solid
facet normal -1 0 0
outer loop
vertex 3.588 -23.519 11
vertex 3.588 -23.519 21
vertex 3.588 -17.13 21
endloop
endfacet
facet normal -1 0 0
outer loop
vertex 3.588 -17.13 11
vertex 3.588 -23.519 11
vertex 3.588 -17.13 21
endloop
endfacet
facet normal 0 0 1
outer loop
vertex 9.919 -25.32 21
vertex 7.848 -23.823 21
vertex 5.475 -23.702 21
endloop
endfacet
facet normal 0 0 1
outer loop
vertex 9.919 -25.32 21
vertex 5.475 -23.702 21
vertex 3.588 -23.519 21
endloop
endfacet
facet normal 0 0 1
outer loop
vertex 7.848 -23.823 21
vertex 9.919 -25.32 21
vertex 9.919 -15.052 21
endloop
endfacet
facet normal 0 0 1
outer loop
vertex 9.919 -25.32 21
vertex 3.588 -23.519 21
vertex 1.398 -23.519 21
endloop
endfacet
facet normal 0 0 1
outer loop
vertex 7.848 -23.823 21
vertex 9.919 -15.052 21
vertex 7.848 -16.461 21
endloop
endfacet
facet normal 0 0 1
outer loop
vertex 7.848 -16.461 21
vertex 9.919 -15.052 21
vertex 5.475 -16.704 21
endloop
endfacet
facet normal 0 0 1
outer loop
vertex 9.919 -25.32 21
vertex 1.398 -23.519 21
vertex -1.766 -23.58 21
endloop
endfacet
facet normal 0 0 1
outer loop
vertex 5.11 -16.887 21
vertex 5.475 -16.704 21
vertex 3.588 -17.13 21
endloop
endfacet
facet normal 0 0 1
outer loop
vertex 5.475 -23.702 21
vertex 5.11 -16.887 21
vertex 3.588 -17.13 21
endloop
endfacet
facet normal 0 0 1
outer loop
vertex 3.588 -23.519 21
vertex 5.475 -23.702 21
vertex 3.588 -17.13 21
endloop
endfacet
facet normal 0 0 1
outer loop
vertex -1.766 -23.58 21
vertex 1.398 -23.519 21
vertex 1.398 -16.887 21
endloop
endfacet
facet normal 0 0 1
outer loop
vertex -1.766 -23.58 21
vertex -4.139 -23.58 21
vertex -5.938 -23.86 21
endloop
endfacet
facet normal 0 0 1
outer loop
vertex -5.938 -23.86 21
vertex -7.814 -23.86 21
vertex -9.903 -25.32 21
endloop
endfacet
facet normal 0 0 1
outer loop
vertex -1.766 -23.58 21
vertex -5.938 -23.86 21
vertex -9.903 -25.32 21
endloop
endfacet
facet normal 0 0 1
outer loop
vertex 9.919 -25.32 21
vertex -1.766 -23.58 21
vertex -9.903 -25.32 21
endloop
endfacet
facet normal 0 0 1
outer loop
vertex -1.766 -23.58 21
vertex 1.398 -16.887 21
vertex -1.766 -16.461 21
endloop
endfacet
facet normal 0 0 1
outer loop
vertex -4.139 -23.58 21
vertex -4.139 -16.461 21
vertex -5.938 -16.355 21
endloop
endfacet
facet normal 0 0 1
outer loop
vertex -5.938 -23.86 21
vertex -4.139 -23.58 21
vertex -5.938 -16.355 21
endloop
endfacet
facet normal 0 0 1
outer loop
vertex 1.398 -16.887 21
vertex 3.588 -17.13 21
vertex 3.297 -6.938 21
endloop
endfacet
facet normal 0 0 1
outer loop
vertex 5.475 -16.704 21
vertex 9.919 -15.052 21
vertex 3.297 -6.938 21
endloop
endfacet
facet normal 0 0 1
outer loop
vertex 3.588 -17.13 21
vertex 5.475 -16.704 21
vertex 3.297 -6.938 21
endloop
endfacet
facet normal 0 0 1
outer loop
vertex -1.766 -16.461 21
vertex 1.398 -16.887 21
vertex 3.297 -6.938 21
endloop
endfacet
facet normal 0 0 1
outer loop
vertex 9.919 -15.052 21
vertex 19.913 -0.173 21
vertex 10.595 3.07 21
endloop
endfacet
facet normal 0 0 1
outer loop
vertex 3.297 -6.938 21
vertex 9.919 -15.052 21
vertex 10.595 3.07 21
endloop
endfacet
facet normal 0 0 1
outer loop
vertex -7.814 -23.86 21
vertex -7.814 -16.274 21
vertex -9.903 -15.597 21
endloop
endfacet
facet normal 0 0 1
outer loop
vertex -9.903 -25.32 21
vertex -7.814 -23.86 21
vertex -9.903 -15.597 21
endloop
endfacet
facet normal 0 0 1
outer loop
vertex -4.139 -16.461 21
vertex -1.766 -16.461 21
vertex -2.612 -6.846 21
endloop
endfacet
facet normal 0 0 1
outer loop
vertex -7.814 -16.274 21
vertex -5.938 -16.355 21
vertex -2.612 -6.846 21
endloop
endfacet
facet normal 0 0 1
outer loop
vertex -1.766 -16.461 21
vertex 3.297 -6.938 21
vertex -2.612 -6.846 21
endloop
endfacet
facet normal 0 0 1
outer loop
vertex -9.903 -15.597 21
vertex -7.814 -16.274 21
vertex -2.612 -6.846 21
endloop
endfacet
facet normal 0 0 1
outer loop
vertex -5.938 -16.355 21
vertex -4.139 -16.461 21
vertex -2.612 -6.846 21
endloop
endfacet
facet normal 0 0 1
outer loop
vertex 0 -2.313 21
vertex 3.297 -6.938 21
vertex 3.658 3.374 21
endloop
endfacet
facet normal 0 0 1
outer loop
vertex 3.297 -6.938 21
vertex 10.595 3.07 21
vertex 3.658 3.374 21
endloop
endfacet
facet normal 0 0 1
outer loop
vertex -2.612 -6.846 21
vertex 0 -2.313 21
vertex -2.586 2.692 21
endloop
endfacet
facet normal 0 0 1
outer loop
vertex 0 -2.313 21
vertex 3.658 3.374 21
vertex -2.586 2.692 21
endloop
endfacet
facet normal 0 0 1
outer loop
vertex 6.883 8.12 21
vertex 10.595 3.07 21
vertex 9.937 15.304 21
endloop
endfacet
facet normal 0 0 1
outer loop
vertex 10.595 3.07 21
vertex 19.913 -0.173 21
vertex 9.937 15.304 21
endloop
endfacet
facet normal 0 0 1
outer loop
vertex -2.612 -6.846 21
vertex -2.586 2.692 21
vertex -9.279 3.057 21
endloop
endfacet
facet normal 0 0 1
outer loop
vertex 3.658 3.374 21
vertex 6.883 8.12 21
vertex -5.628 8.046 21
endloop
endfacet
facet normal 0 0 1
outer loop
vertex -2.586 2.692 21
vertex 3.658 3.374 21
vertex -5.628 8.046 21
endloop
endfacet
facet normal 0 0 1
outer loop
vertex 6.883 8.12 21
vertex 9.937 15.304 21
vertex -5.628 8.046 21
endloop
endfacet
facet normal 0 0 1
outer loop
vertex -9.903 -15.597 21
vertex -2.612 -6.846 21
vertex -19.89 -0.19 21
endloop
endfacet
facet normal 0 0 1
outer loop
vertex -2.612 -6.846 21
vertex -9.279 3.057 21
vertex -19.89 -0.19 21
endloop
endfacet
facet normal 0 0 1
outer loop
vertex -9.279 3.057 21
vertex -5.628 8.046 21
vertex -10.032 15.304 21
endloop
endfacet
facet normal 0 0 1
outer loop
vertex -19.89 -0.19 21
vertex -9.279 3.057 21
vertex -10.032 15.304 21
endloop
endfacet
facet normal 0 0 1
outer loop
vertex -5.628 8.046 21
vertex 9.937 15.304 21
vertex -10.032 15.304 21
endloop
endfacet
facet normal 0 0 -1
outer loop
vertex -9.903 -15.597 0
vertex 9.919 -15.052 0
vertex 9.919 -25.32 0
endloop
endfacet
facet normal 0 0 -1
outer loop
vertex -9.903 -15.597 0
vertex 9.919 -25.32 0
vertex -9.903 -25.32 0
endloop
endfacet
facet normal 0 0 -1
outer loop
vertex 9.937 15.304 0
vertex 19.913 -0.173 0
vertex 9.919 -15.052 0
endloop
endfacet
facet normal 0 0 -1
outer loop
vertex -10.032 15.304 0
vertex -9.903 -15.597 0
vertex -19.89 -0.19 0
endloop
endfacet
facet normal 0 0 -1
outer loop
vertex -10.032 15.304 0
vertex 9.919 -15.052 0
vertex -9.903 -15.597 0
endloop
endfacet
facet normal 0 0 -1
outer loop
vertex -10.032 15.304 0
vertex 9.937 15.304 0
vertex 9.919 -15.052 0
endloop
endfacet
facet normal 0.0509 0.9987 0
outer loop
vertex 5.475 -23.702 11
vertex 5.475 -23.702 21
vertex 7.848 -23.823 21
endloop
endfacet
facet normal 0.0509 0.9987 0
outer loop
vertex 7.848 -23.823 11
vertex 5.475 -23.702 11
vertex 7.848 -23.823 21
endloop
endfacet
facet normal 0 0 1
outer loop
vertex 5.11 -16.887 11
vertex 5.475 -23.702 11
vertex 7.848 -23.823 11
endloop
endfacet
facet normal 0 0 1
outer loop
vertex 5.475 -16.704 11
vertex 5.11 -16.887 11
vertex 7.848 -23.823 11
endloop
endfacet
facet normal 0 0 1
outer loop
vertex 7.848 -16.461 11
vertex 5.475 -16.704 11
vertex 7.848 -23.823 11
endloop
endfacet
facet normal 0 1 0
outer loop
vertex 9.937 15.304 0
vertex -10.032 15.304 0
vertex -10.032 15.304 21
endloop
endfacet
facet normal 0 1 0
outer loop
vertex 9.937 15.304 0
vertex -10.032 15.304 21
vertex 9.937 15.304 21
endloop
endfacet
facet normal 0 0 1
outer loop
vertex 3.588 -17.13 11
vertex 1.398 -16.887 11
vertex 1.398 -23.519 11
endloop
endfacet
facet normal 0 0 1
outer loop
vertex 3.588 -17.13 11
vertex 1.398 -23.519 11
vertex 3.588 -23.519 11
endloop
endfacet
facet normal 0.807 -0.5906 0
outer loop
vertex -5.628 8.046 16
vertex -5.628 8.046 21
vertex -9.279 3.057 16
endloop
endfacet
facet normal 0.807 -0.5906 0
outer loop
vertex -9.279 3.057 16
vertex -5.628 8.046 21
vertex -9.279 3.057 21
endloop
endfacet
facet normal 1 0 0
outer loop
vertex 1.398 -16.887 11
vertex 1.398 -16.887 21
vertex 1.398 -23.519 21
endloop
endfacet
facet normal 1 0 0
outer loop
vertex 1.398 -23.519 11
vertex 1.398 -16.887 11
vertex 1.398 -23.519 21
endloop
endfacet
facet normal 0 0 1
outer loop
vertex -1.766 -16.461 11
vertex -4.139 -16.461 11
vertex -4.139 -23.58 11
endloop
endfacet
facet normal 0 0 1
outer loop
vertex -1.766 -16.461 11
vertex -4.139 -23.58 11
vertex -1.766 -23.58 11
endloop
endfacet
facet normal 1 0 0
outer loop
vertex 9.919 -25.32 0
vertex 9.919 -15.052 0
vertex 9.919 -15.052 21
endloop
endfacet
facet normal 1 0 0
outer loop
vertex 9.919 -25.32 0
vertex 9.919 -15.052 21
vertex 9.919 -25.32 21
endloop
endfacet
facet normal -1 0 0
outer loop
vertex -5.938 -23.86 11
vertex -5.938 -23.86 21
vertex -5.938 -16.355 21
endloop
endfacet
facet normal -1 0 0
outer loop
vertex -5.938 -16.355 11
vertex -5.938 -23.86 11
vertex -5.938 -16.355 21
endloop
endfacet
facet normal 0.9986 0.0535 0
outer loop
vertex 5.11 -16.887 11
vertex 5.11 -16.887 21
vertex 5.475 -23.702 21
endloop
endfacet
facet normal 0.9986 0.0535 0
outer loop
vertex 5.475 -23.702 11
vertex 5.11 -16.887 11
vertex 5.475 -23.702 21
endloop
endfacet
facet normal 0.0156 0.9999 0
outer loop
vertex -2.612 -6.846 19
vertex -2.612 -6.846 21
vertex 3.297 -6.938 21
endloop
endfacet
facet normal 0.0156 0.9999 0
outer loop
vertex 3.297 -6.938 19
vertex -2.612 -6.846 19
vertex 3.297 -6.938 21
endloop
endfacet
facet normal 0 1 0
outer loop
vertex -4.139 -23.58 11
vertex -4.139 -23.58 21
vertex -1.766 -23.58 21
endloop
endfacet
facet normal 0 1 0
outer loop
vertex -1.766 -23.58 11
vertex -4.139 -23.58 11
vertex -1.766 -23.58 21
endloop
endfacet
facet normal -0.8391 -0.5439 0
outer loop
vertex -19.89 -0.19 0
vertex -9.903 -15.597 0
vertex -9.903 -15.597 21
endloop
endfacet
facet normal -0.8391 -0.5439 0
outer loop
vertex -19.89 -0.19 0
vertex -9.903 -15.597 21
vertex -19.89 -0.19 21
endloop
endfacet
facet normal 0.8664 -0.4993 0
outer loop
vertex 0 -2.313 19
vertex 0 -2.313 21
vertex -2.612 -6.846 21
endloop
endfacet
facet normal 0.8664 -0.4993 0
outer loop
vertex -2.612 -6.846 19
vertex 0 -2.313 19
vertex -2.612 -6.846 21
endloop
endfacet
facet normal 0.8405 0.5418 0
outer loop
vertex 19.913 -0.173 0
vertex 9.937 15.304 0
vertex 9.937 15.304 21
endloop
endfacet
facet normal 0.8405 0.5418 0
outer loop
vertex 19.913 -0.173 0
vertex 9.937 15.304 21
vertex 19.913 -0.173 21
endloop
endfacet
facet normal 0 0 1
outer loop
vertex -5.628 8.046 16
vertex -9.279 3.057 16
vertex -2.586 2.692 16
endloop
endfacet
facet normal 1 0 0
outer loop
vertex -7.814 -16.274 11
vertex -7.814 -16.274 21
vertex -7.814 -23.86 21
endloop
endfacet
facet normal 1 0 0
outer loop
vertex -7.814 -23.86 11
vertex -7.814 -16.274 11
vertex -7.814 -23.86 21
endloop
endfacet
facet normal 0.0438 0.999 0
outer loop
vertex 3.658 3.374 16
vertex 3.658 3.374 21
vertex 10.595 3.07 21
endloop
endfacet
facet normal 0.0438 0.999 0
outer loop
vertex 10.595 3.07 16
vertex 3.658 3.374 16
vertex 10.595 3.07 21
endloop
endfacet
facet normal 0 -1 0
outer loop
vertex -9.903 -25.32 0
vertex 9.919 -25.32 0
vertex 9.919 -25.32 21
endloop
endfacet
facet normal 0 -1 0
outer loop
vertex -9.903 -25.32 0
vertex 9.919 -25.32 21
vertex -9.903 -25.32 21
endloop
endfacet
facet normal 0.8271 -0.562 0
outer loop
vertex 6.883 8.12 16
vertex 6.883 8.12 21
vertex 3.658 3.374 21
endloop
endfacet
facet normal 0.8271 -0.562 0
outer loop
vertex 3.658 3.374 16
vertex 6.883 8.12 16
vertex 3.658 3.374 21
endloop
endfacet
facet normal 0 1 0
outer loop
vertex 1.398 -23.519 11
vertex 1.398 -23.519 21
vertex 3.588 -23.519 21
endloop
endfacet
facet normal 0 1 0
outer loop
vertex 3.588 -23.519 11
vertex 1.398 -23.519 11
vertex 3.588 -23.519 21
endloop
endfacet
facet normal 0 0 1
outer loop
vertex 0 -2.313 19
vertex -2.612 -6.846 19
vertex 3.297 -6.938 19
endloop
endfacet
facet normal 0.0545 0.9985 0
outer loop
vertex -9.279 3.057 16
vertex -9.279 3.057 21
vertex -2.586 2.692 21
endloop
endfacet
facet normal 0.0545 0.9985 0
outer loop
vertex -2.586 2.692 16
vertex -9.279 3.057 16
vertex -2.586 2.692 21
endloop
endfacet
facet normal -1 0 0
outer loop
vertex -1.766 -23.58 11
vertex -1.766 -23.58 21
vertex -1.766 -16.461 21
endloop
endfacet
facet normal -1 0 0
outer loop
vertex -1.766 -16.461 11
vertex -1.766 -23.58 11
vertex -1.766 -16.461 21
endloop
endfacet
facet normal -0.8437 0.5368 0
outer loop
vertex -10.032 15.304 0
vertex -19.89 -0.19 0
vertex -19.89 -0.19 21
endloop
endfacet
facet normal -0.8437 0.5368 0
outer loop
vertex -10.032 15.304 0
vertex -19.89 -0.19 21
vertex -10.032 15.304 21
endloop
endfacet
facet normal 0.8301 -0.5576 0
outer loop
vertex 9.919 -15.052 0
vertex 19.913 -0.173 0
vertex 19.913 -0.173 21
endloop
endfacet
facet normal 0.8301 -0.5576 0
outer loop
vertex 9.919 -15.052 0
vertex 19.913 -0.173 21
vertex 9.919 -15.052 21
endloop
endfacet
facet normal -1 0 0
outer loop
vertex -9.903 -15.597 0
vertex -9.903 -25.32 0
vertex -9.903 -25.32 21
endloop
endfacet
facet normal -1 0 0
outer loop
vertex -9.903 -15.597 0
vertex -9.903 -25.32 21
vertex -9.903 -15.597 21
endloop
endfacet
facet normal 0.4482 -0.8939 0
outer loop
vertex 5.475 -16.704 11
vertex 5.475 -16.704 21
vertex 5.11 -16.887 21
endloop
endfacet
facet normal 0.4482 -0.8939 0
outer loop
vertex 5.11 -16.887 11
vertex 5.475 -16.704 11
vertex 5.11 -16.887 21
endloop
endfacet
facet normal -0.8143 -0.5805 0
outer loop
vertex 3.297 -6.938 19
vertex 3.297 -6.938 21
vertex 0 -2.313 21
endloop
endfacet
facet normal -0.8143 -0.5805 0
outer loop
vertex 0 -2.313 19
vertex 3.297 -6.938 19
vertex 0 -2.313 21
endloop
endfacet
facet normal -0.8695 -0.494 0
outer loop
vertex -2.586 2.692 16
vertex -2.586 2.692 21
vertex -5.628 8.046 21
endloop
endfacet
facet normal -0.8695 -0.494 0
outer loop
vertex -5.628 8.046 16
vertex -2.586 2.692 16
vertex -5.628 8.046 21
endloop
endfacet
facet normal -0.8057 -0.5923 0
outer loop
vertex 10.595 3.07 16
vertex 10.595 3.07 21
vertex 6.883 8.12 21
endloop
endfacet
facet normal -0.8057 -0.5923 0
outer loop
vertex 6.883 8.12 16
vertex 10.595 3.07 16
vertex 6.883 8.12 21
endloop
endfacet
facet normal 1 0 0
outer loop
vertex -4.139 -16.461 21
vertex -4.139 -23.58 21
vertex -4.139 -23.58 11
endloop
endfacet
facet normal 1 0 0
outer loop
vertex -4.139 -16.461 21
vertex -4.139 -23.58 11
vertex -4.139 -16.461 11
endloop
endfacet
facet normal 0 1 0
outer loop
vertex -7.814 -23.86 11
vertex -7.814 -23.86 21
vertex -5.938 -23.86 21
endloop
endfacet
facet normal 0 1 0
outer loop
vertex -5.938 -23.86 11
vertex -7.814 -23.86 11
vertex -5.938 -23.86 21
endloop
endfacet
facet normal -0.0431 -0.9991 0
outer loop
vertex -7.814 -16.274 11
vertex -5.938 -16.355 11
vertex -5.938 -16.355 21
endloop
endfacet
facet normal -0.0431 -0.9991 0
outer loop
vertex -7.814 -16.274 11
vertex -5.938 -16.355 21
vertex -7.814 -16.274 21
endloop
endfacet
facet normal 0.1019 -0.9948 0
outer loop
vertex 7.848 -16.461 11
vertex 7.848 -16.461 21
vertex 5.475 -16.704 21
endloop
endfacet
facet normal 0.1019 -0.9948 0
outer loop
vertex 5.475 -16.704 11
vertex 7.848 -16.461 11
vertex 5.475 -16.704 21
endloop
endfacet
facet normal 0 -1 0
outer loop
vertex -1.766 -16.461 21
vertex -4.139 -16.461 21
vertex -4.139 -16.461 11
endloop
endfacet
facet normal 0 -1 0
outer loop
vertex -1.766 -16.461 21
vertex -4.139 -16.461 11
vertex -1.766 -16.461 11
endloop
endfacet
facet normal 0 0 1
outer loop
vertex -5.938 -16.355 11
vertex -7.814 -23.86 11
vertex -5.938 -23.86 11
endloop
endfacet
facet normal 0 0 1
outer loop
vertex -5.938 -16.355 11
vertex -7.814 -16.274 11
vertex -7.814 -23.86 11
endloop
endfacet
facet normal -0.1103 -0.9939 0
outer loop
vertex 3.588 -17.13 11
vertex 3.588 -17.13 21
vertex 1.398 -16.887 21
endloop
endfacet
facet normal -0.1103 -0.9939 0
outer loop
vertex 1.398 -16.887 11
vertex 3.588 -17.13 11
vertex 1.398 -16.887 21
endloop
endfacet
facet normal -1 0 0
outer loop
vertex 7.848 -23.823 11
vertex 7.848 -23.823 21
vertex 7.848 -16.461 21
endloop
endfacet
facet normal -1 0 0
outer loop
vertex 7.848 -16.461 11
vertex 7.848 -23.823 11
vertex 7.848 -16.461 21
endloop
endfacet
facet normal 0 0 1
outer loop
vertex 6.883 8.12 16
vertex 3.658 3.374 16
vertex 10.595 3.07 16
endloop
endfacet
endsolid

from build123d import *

# Parameters (mm, degrees)
PAD_DEPTH       = 21
POCKET_DEPTH    = 5
POCKET001_DEPTH = 5
POCKET002_DEPTH = 10
SKETCH004_W     = 2.373045
SKETCH004_H     = 7.119136
POCKET003_DEPTH = 10
POCKET004_DEPTH = 10
POCKET005_DEPTH = 10
POCKET006_DEPTH = 2


with BuildPart() as part:
    # Sketch → Pad (new body)
    with BuildSketch(Plane.XY):
        Polygon((-10.032319, 15.304274), (9.936683, 15.304274), (19.912732, -0.173444), (9.919492, -15.052223), (9.919492, -25.320239), (-9.903072, -25.320239), (-9.903072, -15.596819), (-19.889567, -0.189549), align=None)
    extrude(amount=PAD_DEPTH)

    # Sketch001 (on Face10 of Pad) → Pocket (cut)
    with BuildSketch(Plane.XY.offset(21)):
        Polygon((-5.628046, 8.046473), (-9.278885, 3.056992), (-2.58568, 2.691908), align=None)
    extrude(amount=-POCKET_DEPTH, mode=Mode.SUBTRACT)

    # Sketch002 (on Face5 of Pocket) → Pocket001 (cut)
    with BuildSketch(Plane.XY.offset(21)):
        Polygon((6.8832, 8.120049), (3.658293, 3.373958), (10.594886, 3.069721), align=None)
    extrude(amount=-POCKET001_DEPTH, mode=Mode.SUBTRACT)

    # Sketch003 (on Face5 of Pocket001) → Pocket002 (cut)
    with BuildSketch(Plane.XY.offset(21)):
        Polygon((-7.814318, -23.860096), (-5.938107, -23.860096), (-5.938107, -16.355255), (-7.814318, -16.27368), align=None)
    extrude(amount=-POCKET002_DEPTH, mode=Mode.SUBTRACT)

    # Sketch004 (on Face5 of Pocket002) → Pocket003 (cut)
    with BuildSketch(Plane.XY.offset(21)):
        with Locations((-2.952688, -20.020277)):
            Rectangle(SKETCH004_W, SKETCH004_H)
    extrude(amount=-POCKET003_DEPTH, mode=Mode.SUBTRACT)

    # Sketch005 (on Face5 of Pocket003) → Pocket004 (cut)
    with BuildSketch(Plane.XY.offset(21)):
        Polygon((1.397894, -16.88661), (1.397894, -23.518969), (3.588397, -23.518969), (3.588397, -17.129999), align=None)
    extrude(amount=-POCKET004_DEPTH, mode=Mode.SUBTRACT)

    # Sketch006 (on Face5 of Pocket004) → Pocket005 (cut)
    with BuildSketch(Plane.XY.offset(21)):
        Polygon((5.109581, -16.88661), (5.474663, -23.701509), (7.847709, -23.823204), (7.847709, -16.460678), (5.474663, -16.704067), align=None)
    extrude(amount=-POCKET005_DEPTH, mode=Mode.SUBTRACT)

    # Sketch007 (on Face5 of Pocket005) → Pocket006 (cut)
    with BuildSketch(Plane.XY.offset(21)):
        Polygon((0, -2.312892), (-2.612413, -6.846357), (3.296795, -6.937919), align=None)
    extrude(amount=-POCKET006_DEPTH, mode=Mode.SUBTRACT)


solid = part.part
